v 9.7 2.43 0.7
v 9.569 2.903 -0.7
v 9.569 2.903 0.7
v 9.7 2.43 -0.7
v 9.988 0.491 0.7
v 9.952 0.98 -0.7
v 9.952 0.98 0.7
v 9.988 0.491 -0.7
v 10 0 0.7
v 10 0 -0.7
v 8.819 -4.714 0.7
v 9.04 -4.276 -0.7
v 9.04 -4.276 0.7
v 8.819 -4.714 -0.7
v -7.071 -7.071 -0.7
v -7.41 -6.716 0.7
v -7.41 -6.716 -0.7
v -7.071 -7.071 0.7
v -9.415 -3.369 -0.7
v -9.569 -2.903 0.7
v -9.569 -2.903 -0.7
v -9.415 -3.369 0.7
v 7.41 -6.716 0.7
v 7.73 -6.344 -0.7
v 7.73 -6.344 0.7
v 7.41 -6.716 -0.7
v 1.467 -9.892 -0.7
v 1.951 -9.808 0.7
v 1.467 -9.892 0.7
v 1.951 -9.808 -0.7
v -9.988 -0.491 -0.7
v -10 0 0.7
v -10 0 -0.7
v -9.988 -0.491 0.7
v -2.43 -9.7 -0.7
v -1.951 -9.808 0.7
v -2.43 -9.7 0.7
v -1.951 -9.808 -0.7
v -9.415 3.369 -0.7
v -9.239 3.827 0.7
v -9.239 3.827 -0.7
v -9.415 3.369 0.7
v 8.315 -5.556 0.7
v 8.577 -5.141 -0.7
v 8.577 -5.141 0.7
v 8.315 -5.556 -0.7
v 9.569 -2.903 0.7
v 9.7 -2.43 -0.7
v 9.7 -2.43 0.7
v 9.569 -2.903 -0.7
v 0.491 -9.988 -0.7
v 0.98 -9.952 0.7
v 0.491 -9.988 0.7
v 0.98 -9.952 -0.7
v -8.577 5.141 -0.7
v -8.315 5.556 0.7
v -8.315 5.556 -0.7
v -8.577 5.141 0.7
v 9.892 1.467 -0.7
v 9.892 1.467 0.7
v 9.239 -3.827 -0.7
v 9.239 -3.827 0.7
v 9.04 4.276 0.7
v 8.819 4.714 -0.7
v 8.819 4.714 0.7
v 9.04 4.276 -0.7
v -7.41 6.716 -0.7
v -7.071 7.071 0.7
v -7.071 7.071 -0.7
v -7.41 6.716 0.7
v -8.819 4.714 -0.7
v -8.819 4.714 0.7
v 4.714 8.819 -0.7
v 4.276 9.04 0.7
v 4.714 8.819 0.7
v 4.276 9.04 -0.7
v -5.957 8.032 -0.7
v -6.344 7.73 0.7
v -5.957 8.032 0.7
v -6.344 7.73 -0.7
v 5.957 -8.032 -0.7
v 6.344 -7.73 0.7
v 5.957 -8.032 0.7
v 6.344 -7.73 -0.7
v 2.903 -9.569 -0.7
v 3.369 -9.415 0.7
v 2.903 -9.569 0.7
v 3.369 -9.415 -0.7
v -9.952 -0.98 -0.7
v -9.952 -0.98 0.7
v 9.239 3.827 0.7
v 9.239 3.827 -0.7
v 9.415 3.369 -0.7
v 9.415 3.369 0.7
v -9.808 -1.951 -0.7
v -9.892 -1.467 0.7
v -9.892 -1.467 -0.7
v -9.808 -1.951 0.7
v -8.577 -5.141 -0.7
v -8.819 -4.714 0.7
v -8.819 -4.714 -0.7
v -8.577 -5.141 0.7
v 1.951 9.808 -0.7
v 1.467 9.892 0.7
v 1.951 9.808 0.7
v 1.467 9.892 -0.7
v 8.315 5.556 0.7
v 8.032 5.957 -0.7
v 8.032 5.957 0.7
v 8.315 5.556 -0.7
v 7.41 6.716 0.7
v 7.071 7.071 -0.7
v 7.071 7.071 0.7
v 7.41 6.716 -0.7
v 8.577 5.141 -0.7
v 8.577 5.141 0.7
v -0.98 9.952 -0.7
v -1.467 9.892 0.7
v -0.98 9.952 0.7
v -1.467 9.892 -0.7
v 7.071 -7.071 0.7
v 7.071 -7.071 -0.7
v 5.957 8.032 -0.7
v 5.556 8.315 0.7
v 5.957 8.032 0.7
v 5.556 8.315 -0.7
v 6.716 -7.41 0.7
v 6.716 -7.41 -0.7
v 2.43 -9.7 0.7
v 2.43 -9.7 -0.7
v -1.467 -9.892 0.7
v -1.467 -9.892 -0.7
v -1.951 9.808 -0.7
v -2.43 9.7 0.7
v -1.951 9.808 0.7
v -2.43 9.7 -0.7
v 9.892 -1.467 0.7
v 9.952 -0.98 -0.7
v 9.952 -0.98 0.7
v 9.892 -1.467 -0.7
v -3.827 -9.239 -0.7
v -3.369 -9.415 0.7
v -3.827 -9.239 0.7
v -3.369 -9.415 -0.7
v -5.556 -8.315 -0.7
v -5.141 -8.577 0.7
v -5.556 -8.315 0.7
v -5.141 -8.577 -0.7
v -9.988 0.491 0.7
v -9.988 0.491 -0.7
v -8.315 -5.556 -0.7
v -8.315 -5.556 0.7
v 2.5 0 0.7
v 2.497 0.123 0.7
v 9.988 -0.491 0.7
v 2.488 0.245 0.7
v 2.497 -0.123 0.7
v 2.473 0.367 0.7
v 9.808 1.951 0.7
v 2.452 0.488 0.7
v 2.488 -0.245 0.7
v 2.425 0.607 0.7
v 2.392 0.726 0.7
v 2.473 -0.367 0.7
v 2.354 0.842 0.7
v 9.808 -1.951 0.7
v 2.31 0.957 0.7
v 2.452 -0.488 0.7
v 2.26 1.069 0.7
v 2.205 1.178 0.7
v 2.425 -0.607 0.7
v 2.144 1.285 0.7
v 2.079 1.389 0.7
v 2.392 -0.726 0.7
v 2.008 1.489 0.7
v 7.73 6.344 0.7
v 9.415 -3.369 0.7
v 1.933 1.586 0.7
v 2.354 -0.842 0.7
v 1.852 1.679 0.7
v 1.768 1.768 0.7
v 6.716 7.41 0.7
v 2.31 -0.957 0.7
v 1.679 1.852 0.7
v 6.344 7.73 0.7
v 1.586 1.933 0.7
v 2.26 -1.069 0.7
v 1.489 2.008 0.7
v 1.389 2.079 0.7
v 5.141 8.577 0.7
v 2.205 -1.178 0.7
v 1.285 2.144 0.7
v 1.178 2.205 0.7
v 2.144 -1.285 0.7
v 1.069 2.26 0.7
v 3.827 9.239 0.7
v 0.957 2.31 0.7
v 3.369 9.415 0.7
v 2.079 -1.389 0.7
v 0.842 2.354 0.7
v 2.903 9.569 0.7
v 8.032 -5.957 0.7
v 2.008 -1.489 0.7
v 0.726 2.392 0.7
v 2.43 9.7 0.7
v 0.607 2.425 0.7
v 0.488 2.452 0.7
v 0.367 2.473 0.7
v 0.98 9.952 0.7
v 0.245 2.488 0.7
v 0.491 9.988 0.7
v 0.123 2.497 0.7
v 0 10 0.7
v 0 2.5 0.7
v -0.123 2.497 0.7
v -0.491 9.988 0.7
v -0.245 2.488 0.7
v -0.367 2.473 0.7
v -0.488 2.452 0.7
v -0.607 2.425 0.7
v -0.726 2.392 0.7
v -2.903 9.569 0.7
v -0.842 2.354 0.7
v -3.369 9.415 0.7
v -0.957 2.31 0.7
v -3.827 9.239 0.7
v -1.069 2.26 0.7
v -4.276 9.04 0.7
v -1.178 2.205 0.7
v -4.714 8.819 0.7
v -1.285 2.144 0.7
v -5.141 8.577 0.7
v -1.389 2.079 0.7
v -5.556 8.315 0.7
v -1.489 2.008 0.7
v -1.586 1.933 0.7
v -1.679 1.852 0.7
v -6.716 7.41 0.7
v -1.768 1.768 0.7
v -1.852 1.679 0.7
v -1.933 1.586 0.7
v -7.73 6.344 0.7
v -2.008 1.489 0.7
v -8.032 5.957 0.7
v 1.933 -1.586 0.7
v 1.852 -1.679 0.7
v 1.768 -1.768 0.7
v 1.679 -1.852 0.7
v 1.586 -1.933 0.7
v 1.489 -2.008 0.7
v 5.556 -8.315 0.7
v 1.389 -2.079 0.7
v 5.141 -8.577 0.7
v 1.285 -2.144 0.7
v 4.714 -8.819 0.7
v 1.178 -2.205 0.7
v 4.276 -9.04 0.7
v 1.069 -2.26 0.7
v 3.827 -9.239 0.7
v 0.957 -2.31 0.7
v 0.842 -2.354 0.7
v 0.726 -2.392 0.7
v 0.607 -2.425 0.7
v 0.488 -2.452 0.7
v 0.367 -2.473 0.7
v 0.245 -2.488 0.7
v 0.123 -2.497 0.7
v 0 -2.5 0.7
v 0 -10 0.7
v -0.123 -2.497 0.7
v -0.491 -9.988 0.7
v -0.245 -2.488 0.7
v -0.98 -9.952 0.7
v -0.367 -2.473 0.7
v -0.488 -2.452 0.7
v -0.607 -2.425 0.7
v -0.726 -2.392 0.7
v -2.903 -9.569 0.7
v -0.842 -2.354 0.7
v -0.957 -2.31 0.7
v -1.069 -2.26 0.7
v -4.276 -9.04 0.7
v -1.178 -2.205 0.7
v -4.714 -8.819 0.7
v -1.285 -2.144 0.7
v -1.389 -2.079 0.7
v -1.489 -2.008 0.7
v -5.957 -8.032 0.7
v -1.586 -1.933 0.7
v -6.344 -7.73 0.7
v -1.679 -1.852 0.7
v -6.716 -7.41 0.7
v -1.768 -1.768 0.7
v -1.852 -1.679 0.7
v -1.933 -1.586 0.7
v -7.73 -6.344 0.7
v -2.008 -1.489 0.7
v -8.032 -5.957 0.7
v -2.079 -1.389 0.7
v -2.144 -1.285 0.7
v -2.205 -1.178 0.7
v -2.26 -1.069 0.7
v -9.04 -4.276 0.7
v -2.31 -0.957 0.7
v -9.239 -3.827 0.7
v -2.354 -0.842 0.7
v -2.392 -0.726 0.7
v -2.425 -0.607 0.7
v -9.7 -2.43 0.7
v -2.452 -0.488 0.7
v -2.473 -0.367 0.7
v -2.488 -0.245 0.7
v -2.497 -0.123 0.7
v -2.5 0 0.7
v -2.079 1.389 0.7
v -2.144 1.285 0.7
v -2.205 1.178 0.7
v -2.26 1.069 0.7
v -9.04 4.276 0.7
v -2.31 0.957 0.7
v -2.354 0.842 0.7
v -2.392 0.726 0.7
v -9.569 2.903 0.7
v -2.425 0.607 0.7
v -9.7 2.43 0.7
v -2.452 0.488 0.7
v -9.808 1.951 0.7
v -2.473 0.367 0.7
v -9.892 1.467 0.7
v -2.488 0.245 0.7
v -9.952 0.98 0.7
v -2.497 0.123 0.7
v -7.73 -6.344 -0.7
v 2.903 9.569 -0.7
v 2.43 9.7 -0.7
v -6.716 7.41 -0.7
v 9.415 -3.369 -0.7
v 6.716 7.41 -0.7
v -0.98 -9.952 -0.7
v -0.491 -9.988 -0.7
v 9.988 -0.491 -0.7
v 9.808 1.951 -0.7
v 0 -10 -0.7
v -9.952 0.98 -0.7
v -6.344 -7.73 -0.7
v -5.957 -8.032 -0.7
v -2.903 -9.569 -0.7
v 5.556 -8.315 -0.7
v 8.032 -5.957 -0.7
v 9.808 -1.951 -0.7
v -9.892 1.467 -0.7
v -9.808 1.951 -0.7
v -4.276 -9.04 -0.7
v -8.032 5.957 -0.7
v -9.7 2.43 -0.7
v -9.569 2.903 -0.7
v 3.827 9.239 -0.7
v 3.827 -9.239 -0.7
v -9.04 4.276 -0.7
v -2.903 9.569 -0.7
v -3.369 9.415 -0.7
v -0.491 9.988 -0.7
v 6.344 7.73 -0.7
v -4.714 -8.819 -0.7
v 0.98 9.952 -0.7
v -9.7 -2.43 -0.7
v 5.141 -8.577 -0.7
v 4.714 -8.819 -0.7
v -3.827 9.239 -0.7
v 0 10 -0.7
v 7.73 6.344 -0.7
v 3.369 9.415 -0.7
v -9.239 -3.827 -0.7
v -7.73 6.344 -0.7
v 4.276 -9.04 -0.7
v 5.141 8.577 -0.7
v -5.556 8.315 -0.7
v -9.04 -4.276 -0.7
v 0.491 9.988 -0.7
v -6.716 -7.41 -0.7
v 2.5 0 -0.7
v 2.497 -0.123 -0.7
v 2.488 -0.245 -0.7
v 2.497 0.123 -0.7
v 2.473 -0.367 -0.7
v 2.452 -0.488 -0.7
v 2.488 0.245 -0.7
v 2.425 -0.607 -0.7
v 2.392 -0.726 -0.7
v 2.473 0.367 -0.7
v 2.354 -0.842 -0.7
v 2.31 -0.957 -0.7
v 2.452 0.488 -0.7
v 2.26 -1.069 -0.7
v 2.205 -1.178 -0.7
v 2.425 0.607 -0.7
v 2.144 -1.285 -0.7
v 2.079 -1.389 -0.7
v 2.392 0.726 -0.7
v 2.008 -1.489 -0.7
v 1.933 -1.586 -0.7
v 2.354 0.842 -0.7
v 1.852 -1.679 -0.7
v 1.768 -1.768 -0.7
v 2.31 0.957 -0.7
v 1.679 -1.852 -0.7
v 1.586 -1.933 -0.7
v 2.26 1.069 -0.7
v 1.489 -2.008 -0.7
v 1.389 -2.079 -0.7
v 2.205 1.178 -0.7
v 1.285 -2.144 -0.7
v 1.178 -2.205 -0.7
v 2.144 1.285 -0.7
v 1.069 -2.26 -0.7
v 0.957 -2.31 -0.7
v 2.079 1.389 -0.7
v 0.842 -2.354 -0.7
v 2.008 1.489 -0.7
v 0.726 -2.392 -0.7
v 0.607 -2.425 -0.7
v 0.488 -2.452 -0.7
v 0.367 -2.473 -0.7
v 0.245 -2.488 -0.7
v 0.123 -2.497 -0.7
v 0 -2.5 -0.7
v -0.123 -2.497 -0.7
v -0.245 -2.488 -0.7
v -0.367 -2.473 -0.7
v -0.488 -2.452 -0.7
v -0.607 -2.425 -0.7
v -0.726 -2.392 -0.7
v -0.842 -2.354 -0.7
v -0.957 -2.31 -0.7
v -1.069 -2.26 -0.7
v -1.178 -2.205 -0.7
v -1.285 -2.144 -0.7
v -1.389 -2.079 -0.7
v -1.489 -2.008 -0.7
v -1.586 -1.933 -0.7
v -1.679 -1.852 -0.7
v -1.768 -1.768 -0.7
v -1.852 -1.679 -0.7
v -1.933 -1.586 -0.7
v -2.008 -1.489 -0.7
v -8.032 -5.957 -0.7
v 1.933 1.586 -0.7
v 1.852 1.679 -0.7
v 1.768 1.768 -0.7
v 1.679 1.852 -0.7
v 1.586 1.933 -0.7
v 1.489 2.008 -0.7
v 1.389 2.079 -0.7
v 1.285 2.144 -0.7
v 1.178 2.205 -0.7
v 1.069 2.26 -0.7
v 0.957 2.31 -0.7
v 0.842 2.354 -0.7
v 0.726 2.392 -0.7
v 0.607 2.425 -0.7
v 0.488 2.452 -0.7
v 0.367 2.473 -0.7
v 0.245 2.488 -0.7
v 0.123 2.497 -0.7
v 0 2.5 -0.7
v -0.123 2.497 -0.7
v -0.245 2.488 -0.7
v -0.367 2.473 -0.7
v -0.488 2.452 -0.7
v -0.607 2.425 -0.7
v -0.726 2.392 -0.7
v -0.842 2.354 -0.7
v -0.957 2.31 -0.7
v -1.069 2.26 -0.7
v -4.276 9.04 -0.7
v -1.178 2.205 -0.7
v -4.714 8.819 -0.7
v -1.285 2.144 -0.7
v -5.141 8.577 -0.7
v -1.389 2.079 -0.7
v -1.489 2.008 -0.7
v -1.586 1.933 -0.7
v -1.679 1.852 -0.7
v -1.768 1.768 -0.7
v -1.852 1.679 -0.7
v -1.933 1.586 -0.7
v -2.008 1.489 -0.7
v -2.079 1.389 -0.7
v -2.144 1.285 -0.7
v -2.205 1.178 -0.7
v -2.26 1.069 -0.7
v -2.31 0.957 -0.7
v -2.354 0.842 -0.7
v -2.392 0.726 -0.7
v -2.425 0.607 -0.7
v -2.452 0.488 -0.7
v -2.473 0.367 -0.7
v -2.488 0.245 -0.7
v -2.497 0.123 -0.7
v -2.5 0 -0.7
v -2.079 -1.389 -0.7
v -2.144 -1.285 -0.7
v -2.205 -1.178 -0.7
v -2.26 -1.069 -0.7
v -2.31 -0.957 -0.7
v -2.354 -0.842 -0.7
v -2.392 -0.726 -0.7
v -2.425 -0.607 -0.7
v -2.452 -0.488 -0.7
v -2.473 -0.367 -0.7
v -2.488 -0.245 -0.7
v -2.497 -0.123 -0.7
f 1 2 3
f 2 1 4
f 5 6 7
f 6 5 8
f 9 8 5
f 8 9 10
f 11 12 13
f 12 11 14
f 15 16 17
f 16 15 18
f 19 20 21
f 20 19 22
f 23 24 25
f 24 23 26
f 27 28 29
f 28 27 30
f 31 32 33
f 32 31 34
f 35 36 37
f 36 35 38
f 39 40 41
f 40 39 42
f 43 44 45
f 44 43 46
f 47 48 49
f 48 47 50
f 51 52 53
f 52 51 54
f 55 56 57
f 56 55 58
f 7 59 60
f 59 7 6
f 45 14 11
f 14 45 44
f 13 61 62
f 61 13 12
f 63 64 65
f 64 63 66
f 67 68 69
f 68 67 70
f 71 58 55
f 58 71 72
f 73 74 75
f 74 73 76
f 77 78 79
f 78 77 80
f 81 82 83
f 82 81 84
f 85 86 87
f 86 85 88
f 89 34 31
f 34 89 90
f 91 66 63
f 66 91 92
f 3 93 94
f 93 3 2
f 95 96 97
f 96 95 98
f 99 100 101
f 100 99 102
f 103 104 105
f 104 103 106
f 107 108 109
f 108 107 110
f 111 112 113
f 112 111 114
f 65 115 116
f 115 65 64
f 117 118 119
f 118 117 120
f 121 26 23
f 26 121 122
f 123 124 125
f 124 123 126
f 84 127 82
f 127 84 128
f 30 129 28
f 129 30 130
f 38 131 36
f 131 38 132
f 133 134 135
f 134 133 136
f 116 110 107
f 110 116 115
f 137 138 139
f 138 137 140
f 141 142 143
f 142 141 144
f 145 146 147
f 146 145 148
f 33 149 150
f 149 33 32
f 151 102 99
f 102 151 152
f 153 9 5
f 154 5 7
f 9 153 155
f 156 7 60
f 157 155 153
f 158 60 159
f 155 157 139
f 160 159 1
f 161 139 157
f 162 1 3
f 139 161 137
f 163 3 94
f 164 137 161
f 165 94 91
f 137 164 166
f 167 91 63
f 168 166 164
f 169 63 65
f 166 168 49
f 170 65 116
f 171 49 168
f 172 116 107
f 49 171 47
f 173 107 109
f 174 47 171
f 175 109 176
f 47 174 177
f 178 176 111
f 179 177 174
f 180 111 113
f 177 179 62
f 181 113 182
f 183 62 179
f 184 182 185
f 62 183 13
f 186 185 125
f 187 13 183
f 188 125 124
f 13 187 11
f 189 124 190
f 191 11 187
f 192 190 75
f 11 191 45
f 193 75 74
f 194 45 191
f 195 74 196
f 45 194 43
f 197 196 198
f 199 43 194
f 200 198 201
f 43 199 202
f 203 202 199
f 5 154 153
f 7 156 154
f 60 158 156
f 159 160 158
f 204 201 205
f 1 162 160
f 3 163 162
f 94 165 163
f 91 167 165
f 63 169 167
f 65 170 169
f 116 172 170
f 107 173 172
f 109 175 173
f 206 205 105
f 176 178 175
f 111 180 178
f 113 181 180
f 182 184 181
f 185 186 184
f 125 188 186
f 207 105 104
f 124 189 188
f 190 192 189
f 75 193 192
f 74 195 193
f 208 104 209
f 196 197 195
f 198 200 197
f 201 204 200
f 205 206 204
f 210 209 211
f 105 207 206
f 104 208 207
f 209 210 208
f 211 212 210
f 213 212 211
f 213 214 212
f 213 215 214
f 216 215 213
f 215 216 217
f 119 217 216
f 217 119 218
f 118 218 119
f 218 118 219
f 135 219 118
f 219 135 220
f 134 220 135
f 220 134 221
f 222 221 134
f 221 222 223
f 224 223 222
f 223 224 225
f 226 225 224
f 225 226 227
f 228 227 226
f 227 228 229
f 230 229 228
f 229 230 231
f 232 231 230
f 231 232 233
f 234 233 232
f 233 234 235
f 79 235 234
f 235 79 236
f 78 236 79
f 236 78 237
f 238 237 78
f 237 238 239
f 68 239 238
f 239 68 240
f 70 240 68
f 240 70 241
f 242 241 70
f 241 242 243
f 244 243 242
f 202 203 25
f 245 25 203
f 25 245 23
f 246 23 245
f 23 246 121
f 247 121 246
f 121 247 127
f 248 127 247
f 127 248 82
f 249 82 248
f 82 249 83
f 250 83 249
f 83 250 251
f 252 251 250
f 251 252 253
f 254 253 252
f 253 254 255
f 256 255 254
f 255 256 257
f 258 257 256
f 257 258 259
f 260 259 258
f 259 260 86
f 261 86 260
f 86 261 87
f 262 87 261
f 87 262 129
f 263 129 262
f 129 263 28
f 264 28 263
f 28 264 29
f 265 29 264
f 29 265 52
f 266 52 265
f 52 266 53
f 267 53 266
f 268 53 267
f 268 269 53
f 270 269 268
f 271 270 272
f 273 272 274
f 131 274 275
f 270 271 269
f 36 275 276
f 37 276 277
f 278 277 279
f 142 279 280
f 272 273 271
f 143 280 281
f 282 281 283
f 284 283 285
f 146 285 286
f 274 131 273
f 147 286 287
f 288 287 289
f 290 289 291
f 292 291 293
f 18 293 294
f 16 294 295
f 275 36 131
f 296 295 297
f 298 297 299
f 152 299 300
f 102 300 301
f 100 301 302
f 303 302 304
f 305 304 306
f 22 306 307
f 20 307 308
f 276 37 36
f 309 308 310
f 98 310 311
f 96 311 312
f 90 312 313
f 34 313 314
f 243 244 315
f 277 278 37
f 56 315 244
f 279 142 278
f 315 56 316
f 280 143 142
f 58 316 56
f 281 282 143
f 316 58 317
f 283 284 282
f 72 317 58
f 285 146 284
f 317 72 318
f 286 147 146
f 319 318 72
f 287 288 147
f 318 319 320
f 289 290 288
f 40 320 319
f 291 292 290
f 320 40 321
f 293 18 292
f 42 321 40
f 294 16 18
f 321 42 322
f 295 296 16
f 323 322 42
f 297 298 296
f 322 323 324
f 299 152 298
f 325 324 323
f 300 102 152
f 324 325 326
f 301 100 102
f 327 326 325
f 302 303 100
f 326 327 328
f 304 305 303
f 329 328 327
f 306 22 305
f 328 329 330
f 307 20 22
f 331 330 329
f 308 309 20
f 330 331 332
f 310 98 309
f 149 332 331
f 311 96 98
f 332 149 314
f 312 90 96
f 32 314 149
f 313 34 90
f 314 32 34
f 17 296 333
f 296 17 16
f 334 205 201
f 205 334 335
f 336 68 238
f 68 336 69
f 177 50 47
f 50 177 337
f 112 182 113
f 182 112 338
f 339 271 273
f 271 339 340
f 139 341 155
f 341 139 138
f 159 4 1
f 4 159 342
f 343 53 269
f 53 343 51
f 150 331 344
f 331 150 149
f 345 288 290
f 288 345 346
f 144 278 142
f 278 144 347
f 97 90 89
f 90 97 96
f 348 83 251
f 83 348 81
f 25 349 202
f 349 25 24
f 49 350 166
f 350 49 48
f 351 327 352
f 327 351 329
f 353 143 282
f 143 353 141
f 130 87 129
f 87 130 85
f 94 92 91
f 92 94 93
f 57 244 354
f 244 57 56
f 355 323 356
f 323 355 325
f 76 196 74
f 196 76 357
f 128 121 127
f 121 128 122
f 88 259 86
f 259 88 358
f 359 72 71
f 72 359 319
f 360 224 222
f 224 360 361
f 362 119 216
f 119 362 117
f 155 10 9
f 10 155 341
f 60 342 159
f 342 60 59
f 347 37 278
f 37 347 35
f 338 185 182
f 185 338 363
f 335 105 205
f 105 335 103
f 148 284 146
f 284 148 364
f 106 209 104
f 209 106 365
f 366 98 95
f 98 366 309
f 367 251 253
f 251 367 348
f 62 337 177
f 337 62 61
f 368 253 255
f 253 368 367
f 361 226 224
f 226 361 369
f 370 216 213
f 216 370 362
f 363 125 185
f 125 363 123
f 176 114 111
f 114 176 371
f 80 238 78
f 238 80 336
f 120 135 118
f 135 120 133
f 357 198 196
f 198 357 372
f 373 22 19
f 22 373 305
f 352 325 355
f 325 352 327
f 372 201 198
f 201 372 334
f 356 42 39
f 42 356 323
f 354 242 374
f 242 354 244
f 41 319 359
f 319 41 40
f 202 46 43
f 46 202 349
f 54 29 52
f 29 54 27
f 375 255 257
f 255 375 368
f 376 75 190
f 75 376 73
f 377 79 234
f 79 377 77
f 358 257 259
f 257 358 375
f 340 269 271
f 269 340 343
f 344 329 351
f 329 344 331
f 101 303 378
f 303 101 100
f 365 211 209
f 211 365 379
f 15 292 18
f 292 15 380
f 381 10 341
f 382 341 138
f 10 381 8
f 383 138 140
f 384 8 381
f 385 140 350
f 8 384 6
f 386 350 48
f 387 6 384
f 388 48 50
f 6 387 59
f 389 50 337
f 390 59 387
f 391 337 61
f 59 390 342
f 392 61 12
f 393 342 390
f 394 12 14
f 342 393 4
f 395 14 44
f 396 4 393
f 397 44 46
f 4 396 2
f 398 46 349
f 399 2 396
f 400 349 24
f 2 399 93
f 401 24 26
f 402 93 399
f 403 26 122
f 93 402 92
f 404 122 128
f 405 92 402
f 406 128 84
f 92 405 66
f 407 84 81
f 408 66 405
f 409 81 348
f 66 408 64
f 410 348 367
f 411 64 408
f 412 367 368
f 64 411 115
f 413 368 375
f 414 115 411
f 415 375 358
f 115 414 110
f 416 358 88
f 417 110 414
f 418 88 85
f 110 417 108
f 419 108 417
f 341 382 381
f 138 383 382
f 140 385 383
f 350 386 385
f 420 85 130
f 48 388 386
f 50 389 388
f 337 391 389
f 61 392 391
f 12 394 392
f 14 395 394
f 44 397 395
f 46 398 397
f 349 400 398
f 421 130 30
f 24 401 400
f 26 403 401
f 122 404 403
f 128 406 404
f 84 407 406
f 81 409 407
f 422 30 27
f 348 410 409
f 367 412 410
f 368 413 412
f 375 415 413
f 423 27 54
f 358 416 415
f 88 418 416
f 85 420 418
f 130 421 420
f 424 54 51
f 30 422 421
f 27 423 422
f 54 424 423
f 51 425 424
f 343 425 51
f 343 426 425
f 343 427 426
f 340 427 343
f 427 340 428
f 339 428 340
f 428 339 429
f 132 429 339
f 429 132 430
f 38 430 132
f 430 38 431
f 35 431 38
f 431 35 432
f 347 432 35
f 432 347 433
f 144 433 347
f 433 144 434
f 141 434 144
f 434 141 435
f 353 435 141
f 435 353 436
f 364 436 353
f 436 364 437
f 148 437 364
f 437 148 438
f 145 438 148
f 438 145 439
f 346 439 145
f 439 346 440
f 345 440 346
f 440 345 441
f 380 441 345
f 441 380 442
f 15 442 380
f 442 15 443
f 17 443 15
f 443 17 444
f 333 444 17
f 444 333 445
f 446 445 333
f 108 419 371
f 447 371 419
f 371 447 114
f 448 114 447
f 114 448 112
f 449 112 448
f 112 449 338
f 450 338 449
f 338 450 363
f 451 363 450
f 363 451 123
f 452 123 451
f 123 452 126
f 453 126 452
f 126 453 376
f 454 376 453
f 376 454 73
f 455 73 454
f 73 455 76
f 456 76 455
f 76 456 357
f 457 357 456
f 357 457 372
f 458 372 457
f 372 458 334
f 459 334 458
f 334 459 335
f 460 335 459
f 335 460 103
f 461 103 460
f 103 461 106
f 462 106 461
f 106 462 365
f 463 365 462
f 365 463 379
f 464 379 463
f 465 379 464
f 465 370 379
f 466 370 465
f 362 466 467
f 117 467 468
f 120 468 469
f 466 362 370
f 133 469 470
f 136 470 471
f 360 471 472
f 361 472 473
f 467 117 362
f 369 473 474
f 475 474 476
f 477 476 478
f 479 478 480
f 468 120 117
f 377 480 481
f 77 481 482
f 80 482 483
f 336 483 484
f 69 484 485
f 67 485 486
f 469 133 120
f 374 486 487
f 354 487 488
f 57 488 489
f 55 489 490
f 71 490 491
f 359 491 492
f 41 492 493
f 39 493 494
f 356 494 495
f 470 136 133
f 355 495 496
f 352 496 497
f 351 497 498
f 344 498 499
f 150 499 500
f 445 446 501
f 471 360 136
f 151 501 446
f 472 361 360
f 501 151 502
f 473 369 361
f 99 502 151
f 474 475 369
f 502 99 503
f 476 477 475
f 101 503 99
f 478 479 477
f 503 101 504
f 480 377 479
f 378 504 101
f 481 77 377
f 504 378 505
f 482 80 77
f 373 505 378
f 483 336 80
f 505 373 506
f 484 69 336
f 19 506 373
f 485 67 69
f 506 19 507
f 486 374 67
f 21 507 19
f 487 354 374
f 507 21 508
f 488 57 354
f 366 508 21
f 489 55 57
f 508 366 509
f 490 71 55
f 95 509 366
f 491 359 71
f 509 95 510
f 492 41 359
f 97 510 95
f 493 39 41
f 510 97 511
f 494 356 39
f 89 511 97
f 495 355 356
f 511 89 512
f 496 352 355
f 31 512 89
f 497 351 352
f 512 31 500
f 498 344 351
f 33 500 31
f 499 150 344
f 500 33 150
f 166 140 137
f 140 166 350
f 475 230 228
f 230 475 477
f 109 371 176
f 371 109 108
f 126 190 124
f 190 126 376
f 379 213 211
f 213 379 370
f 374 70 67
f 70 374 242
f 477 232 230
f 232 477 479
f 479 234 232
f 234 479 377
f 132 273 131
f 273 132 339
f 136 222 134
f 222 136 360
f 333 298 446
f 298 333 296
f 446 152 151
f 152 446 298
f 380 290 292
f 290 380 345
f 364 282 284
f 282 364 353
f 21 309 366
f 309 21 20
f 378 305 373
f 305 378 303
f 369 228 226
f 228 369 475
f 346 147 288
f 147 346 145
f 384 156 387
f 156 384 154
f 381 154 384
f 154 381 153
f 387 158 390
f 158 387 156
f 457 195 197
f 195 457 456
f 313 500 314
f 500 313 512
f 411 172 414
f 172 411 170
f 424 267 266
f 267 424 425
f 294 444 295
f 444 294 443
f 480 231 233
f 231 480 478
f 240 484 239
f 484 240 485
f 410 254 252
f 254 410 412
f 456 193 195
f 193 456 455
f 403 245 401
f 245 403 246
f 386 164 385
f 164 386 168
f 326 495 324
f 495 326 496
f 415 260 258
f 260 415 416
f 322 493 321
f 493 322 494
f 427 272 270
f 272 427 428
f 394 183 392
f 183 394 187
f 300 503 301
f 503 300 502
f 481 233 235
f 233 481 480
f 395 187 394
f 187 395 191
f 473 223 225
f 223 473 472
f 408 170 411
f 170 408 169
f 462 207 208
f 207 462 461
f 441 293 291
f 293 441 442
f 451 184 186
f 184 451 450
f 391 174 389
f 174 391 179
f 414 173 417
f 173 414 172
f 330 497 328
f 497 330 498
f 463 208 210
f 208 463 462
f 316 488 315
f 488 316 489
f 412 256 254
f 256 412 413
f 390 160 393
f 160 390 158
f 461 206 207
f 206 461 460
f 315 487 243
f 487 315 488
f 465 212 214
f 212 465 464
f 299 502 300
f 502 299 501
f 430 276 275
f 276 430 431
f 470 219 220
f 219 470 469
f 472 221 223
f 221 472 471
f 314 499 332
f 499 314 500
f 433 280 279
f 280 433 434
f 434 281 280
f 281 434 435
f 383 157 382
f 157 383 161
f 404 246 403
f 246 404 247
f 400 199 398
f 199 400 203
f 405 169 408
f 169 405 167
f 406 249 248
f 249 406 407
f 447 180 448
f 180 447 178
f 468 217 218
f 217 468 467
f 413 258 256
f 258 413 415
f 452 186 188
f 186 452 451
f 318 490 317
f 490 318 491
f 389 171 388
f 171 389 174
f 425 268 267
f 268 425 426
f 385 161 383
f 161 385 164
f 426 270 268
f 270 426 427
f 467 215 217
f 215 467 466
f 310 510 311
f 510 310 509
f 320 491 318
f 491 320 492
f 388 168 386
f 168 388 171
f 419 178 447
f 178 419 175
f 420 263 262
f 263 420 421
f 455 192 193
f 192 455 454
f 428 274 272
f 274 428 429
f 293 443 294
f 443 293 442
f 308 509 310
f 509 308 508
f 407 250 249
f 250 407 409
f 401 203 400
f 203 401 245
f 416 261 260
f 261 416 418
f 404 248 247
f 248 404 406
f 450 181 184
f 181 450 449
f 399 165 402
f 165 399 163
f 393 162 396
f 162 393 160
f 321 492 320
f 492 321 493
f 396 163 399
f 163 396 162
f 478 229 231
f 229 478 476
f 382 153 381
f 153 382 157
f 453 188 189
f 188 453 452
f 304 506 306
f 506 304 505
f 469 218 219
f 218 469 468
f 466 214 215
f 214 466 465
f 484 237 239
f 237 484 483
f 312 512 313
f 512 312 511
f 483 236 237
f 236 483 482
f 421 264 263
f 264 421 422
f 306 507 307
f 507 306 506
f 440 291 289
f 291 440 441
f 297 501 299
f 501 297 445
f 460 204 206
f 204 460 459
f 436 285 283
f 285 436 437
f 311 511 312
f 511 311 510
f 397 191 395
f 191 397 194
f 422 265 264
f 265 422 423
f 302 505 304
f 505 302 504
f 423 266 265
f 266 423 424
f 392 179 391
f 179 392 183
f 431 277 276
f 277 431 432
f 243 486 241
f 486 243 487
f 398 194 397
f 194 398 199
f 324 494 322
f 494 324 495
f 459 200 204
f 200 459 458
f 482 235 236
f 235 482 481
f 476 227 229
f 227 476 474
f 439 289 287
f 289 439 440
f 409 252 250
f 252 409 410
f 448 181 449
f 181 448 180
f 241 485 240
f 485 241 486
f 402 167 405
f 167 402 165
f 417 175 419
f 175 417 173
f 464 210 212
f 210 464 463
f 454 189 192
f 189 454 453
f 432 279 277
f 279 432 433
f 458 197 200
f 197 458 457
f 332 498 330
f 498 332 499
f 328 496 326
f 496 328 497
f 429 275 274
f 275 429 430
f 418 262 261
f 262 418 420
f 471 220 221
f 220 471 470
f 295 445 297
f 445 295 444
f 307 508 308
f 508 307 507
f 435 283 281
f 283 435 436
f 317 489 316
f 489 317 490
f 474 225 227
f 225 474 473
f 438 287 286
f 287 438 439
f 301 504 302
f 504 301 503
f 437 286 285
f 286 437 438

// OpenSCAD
$fn=128;

module penny_washer(id=5.0, od=20.0, thickness=1.4) {
    difference() {
        cylinder(d=od, h=thickness, center=true);
        cylinder(d=id, h=thickness+0.2, center=true);
    }
}

penny_washer();
